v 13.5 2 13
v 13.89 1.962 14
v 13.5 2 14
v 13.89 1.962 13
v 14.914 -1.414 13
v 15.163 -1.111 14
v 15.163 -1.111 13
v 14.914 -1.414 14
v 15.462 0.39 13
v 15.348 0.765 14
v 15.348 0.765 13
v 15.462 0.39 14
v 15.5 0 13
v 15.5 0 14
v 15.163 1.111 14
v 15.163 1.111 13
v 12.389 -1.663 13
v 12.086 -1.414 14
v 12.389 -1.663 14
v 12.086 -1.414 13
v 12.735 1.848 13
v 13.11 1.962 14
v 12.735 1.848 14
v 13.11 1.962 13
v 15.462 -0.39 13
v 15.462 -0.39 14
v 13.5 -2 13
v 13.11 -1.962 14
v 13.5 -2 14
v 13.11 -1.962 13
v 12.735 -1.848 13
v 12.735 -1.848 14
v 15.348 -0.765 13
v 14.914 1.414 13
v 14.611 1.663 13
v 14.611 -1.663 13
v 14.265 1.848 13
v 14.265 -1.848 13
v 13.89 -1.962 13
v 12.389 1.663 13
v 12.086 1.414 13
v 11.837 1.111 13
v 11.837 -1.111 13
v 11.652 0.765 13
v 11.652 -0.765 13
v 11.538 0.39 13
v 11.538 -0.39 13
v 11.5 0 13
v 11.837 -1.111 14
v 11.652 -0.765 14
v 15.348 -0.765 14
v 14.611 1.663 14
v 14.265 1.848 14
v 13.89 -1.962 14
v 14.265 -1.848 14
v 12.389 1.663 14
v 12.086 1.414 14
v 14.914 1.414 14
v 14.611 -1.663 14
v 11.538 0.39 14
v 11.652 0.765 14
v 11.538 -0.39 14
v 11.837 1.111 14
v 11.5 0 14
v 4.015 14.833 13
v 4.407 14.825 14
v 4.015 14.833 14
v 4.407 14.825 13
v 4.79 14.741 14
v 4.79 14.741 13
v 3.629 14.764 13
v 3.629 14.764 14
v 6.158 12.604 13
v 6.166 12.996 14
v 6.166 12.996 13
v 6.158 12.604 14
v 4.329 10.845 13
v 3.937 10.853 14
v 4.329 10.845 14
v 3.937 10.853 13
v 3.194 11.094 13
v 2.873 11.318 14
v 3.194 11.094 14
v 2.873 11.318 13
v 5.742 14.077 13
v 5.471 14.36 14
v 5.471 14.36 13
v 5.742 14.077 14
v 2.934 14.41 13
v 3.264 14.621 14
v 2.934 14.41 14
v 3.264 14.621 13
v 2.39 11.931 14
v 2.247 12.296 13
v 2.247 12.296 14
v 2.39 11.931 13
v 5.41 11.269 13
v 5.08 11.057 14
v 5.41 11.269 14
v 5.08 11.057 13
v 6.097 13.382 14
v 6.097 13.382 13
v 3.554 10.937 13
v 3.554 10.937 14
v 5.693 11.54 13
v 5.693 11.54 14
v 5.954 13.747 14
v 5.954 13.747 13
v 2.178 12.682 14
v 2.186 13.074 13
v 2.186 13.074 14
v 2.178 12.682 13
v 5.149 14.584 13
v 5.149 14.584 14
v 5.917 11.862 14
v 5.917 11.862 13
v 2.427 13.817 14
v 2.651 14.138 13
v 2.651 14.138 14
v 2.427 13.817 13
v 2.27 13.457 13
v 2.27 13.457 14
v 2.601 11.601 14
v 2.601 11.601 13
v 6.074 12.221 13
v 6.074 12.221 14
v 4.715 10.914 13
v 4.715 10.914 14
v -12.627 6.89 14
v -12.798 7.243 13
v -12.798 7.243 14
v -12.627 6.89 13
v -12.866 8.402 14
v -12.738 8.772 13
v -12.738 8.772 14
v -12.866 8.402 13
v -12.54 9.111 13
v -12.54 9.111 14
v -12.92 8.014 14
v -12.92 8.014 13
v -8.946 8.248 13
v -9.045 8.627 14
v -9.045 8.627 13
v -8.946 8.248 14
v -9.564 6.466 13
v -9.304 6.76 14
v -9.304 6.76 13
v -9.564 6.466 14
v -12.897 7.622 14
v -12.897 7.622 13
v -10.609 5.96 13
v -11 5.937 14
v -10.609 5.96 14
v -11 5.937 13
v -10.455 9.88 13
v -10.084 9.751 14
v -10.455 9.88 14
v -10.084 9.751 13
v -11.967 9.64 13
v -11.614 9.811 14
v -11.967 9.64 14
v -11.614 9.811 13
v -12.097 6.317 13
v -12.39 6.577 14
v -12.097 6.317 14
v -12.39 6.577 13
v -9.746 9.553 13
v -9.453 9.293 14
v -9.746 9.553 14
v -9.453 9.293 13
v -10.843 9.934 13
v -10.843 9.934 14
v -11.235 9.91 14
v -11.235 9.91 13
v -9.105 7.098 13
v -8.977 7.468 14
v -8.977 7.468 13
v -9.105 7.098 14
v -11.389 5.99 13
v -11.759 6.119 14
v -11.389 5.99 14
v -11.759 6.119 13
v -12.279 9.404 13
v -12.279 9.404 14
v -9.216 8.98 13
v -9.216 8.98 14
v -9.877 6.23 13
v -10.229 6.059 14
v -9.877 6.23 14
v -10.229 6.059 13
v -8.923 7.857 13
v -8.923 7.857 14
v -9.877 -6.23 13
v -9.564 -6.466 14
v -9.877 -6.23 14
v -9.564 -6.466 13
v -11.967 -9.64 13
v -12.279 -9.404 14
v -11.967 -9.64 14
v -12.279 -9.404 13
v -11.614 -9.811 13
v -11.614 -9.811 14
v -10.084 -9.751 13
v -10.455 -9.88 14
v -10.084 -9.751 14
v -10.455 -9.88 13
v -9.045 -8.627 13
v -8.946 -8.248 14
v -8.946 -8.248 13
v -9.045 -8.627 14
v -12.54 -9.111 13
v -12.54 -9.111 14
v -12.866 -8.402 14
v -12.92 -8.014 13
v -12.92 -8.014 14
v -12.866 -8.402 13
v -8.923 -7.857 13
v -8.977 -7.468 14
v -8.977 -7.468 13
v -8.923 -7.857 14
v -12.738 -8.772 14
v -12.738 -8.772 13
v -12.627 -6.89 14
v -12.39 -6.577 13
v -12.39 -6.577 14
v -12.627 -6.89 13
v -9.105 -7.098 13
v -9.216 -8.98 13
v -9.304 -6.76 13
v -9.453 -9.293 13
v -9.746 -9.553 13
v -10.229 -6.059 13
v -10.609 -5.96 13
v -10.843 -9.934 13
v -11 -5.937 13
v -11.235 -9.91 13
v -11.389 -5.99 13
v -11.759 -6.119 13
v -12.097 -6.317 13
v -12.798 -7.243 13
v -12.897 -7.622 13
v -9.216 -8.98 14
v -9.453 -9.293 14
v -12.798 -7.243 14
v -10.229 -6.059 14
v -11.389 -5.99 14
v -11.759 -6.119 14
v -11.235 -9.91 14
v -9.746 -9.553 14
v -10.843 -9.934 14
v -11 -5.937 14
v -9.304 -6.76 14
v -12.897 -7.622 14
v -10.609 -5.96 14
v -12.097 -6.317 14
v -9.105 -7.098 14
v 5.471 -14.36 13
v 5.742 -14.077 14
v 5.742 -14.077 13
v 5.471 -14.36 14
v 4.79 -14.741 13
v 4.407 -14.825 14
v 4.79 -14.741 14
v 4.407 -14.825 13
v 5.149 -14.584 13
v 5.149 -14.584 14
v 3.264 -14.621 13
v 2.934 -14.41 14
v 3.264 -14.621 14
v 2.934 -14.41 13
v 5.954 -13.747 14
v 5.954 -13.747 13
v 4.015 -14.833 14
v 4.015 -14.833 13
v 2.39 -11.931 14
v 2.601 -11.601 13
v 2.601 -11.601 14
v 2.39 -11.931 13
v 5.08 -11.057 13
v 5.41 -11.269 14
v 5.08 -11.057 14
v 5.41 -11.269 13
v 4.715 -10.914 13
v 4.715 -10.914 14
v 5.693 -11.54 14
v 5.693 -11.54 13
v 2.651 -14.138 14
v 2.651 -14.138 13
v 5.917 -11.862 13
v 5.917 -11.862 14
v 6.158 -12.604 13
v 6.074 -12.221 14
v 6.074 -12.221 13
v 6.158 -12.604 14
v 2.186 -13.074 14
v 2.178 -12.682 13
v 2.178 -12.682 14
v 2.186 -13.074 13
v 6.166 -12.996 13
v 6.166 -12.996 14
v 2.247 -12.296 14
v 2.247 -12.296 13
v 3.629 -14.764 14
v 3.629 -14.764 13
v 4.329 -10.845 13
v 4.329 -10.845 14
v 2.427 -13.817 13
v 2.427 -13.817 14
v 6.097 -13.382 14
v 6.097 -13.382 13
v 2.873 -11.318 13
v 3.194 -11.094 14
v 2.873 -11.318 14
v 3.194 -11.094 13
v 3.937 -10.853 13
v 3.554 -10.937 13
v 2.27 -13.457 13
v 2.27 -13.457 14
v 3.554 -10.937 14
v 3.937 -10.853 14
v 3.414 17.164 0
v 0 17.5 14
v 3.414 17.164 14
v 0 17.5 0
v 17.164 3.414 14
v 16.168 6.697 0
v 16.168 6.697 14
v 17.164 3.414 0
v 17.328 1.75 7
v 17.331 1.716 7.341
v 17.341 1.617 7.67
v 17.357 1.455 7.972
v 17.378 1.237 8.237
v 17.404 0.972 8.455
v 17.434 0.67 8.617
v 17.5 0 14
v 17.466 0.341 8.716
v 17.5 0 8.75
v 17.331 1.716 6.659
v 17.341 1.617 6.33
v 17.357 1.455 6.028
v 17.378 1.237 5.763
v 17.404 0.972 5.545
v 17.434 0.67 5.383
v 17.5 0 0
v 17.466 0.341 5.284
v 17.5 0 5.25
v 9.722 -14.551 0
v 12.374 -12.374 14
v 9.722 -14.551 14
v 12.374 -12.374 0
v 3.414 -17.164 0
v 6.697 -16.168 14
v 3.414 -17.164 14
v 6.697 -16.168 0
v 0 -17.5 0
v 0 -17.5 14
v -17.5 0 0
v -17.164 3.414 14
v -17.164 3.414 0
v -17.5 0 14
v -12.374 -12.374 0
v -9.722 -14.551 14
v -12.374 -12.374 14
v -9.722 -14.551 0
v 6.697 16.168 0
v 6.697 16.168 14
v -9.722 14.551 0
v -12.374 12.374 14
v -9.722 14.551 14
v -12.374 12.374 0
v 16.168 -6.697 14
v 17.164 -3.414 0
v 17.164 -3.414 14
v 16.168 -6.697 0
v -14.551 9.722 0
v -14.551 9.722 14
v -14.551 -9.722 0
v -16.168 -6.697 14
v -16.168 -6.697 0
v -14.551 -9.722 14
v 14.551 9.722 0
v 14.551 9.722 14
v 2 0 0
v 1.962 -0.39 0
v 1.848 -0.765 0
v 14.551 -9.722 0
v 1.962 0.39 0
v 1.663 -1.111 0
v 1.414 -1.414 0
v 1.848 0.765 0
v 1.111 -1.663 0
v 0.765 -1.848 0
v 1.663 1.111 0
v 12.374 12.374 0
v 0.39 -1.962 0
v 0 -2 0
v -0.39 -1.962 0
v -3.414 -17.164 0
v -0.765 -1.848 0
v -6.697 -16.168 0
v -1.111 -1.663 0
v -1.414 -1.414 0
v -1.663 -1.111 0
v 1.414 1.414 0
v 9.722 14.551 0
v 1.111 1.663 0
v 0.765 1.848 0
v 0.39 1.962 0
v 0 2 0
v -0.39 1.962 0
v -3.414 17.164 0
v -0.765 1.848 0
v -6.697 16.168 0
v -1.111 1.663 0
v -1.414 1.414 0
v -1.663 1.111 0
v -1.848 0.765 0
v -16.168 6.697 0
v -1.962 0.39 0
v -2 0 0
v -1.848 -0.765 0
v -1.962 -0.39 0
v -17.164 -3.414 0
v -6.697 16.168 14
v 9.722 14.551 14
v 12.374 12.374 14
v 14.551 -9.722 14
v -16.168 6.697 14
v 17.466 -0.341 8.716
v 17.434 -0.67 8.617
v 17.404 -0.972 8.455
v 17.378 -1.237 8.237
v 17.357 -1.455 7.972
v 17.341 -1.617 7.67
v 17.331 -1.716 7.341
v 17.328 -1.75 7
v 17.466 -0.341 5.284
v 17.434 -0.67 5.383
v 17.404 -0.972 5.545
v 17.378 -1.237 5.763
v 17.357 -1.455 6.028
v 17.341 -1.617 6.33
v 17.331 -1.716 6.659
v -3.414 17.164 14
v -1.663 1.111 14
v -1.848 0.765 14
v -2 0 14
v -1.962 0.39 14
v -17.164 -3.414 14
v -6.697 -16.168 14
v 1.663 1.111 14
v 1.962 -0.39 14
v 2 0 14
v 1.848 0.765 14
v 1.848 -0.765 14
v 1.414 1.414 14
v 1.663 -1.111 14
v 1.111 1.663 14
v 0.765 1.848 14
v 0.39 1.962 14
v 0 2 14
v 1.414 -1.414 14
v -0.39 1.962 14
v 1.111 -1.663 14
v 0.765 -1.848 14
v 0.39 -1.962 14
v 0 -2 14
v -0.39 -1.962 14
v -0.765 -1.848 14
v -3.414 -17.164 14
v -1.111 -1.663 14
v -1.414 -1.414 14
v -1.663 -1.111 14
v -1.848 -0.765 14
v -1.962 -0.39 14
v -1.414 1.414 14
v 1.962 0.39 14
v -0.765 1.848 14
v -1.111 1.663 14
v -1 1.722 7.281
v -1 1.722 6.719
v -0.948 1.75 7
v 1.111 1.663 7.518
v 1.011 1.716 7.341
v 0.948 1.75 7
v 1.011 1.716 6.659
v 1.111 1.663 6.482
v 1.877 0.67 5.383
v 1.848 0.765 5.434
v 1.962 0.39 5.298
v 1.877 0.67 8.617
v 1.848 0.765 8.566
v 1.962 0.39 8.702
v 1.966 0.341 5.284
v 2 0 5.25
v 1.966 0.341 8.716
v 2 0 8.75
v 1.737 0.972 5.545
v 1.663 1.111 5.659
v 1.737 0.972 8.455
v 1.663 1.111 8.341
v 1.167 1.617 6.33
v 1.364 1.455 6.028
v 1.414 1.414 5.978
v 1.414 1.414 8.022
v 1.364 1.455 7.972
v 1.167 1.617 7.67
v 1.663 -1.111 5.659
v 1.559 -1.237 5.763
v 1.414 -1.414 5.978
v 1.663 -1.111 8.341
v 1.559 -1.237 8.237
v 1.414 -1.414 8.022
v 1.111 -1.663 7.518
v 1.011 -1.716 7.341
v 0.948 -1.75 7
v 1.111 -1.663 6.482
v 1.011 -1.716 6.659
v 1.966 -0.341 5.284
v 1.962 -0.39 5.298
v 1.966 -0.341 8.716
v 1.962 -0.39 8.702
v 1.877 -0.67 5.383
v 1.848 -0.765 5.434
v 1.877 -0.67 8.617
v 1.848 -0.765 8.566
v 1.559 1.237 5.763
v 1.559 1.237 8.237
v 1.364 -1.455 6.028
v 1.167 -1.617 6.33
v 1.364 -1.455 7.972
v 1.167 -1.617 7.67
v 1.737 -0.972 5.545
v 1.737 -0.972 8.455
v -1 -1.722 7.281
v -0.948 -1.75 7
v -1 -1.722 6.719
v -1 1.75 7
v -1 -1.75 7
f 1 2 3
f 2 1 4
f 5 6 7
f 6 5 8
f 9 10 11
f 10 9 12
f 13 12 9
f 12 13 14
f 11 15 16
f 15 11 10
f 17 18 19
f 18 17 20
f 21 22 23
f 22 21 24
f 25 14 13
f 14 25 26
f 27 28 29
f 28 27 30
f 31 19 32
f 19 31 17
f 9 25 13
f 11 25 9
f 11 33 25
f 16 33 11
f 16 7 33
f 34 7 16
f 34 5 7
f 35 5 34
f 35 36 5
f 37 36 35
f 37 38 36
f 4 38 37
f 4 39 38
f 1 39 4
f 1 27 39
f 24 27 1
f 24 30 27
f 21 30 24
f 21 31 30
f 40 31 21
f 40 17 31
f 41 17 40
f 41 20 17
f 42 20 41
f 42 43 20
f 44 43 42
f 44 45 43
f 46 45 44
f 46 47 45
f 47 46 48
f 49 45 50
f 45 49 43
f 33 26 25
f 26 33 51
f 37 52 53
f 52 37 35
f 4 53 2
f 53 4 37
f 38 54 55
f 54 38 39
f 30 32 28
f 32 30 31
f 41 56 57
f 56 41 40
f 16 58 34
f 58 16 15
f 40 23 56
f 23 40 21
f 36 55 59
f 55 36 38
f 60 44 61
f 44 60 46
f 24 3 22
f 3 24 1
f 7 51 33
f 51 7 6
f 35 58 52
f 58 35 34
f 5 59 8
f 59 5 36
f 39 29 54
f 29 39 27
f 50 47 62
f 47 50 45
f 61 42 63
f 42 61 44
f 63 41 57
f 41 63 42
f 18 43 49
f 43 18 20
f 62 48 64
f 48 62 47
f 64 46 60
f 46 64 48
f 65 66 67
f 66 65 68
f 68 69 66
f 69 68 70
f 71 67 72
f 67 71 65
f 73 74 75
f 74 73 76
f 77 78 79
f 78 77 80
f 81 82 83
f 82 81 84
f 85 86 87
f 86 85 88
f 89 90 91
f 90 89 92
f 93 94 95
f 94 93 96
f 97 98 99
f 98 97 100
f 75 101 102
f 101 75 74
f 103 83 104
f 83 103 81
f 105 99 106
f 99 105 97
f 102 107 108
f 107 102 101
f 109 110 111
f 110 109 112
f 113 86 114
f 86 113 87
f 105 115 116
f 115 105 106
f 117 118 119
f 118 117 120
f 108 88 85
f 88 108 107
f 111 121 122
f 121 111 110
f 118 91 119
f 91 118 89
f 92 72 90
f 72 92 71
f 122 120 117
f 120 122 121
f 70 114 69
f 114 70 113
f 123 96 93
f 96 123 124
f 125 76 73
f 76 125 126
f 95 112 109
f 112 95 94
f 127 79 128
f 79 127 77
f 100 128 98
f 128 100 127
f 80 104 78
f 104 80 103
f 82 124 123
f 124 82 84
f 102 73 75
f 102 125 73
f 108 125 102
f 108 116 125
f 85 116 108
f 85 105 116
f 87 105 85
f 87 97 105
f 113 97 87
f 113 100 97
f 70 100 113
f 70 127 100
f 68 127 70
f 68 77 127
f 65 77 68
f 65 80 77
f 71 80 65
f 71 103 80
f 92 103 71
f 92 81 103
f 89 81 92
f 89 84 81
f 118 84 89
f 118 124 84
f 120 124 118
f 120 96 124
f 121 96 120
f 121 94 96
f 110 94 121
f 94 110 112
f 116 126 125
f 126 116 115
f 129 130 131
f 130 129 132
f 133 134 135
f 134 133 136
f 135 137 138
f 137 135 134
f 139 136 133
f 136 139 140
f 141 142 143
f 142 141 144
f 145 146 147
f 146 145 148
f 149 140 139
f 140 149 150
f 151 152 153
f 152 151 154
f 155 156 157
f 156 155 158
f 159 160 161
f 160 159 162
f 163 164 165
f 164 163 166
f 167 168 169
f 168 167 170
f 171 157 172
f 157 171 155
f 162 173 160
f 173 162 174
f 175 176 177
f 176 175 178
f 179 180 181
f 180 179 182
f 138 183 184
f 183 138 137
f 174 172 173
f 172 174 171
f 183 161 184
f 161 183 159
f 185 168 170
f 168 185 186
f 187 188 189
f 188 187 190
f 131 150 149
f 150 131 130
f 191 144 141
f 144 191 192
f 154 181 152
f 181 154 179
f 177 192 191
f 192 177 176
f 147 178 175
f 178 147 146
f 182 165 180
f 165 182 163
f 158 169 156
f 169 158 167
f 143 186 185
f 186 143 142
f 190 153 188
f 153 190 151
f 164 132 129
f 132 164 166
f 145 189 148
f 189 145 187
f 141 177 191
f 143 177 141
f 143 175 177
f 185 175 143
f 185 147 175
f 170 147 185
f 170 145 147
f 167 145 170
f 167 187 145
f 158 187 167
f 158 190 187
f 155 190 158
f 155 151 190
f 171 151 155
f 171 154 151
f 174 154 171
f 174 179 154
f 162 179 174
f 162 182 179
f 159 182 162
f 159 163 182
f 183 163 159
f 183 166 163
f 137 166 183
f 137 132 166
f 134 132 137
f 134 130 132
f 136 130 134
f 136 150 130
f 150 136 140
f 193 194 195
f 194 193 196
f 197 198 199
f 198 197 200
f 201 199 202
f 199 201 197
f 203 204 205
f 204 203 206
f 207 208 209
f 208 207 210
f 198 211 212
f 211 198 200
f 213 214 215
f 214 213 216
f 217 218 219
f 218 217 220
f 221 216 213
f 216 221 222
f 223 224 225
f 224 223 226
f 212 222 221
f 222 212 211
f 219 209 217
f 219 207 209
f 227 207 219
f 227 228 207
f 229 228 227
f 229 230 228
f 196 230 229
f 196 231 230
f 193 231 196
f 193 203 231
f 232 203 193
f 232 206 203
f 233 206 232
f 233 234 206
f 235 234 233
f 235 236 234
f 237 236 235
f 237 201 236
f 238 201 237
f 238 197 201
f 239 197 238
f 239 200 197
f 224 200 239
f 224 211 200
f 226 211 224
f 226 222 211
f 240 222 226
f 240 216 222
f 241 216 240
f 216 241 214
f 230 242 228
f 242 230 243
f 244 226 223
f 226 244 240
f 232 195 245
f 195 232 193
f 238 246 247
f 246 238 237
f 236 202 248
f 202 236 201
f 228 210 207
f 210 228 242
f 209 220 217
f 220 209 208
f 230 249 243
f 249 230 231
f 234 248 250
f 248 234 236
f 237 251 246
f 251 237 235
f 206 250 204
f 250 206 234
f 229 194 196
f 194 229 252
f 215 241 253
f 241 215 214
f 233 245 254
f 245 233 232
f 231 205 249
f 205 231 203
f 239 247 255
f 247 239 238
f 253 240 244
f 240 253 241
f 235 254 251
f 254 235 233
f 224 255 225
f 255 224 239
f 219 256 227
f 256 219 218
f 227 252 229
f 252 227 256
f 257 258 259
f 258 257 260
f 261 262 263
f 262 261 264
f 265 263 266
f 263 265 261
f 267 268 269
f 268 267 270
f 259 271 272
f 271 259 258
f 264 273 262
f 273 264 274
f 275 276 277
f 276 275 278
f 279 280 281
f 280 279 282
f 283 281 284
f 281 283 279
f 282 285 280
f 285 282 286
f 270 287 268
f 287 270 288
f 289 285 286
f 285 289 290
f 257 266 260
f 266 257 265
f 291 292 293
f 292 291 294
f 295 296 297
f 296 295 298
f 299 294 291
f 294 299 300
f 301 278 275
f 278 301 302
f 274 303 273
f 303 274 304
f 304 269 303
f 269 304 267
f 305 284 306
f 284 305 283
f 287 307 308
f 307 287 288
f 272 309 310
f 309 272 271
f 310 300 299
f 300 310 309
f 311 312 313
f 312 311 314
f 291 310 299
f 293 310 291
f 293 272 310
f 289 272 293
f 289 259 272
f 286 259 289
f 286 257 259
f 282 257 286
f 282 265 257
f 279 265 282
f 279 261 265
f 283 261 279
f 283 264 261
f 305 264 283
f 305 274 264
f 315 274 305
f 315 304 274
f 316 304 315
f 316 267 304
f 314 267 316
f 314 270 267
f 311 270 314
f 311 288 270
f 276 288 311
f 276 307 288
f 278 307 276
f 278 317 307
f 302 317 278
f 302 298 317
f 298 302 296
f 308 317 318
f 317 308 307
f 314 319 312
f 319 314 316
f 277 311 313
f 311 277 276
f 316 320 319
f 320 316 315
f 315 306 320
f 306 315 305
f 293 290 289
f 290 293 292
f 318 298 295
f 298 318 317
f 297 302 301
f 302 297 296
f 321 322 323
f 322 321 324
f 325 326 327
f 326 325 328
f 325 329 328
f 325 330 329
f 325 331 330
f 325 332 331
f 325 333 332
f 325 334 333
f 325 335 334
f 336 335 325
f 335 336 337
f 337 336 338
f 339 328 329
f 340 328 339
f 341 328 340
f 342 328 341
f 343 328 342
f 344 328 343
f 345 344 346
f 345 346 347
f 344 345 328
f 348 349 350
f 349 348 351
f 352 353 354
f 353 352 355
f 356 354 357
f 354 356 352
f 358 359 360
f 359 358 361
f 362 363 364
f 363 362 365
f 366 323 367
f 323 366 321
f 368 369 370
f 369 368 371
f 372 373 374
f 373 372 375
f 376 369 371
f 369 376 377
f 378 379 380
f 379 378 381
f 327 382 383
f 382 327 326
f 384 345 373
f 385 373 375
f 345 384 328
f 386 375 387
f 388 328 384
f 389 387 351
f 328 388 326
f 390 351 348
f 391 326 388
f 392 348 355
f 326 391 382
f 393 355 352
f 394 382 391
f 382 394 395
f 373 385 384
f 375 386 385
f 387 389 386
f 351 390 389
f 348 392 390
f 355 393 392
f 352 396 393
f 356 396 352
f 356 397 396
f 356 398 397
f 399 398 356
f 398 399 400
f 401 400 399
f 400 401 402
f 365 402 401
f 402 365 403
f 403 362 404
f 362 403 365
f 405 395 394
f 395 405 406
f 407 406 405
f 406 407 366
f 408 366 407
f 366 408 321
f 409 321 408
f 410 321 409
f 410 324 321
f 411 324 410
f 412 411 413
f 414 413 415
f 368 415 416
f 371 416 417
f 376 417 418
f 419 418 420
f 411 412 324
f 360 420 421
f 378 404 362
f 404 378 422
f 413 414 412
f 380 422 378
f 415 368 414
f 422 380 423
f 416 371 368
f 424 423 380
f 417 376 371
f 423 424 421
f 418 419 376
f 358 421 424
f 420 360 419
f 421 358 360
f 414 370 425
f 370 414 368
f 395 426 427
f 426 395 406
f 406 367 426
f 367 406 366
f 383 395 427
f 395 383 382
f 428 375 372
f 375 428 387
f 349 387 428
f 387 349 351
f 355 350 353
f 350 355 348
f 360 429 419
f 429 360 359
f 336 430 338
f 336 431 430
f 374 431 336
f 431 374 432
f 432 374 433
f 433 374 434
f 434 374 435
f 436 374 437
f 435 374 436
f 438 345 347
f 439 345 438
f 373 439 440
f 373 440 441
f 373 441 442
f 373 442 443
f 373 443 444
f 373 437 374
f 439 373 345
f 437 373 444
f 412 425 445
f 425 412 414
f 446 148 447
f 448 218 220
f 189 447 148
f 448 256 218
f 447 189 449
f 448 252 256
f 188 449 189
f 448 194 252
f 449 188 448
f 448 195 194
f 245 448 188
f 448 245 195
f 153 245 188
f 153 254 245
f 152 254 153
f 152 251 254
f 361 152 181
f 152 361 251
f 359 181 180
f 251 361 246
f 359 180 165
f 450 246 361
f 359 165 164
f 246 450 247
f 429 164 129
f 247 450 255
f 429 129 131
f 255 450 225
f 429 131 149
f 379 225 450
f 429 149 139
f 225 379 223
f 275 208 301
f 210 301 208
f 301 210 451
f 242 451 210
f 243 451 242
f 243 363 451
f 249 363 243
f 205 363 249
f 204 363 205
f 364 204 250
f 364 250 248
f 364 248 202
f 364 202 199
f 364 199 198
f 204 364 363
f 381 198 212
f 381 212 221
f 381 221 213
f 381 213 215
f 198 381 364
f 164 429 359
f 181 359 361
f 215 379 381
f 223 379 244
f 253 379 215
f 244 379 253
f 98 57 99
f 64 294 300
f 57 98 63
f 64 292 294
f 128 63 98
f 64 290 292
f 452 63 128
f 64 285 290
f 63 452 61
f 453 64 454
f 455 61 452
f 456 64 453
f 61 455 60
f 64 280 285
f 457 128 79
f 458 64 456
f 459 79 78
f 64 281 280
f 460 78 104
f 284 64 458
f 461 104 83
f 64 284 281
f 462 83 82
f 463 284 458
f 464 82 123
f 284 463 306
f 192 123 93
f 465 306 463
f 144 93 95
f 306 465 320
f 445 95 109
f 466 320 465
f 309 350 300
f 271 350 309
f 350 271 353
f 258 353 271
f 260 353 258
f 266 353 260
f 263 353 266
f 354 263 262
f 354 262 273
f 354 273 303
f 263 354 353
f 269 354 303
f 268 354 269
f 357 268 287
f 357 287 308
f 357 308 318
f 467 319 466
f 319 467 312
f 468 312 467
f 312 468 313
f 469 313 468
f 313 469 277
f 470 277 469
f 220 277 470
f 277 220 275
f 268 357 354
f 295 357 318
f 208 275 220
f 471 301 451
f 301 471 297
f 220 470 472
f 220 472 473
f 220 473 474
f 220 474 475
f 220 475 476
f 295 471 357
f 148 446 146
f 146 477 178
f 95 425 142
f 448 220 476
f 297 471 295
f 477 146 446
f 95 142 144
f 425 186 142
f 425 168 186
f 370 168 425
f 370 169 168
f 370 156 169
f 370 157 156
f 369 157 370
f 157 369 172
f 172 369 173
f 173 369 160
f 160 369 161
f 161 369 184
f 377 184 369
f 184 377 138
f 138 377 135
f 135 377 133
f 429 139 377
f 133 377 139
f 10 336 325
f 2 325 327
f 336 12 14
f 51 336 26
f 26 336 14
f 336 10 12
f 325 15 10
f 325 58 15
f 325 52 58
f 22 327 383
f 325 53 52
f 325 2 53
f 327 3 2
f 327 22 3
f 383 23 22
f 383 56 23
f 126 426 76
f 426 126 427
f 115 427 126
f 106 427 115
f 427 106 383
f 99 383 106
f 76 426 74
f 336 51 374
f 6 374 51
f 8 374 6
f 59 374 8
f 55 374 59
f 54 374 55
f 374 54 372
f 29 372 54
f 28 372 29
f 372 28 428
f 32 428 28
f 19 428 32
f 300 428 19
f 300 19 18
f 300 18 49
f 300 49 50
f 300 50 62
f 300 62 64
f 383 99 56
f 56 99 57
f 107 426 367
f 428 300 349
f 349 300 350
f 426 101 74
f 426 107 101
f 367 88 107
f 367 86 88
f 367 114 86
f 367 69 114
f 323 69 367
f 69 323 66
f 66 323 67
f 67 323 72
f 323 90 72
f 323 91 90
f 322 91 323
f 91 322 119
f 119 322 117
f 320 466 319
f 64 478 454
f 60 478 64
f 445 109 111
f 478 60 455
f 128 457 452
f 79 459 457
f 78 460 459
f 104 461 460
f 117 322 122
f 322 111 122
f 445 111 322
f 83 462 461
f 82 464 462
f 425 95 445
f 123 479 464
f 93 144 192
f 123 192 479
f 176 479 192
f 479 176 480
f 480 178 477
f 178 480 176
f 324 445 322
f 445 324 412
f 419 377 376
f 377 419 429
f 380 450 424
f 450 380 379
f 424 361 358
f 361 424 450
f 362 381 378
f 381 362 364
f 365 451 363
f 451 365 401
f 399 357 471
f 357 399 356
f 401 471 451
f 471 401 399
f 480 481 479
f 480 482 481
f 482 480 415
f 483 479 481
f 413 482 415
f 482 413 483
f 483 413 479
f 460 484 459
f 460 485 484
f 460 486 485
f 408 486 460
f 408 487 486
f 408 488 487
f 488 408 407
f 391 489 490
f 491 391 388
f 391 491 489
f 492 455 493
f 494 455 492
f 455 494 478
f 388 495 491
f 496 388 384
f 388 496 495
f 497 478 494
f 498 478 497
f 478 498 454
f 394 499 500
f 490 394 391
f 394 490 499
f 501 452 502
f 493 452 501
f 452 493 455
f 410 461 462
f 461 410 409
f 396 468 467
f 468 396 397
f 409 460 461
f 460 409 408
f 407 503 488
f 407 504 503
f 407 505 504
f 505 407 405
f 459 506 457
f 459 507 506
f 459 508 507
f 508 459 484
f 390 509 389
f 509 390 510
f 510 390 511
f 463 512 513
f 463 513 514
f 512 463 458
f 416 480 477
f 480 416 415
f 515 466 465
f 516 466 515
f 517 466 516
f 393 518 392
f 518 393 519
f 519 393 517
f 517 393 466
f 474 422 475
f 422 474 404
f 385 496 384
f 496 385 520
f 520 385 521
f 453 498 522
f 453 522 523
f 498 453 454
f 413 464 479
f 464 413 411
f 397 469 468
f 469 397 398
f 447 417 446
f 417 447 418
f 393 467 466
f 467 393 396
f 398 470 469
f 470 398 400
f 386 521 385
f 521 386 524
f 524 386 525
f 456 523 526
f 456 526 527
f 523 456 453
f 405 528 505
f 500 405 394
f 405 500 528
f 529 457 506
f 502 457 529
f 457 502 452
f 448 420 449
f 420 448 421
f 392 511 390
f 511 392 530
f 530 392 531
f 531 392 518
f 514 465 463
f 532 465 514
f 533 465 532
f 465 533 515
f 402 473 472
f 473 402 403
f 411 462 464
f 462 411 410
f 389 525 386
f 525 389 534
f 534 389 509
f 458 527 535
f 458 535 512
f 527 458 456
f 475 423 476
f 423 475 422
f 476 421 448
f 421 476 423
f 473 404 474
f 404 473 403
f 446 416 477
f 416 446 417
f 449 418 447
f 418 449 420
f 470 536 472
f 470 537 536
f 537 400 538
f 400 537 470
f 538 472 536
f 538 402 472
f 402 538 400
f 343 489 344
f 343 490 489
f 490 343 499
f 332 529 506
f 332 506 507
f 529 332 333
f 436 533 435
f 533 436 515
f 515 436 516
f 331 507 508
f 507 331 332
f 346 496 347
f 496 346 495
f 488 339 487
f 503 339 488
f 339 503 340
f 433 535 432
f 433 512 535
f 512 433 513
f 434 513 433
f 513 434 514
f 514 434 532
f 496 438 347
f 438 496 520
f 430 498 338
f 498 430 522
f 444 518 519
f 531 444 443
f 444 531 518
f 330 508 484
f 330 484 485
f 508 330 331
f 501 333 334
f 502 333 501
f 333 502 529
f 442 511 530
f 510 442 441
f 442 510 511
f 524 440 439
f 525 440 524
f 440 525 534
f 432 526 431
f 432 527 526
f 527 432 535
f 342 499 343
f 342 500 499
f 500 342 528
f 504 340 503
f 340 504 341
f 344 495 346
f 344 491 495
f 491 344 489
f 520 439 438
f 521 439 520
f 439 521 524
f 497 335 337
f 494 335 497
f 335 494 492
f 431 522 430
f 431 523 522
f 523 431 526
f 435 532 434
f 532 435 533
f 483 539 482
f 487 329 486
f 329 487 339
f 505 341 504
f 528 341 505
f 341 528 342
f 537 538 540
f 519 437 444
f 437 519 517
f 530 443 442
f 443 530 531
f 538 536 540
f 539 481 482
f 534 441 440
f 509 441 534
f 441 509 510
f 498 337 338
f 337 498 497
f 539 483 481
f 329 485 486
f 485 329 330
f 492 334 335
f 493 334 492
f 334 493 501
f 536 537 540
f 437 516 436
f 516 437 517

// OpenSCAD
$fn = 32;

// ----------------------------------------------------------------------
// Control knob: dimpled knob
// ----------------------------------------------------------------------

// --- parameters (mm) ---
dimp_d = 4;               // finger dimple diameter
n_dimp = 5;               // number of dimples
dimp_r = 13.5;            // dimple ring radius
knob_d = 35;              // knob body diameter
knob_h = 14;              // knob body height
bore_d = 4;               // shaft bore diameter
set_d = 3.5;              // set screw bore diameter

dimp_step = 360 / n_dimp;  // dimple angular step

difference() {
  cylinder(h = knob_h, d = knob_d);
  translate([0, 0, -1]) cylinder(h = knob_h + 2, d = bore_d);
  translate([-1, 0, knob_h / 2]) rotate([0, 90, 0])
    cylinder(h = knob_d / 2 + bore_d / 2 + 2, d = set_d);  for (i = [0 : n_dimp - 1])
    rotate([0, 0, i * dimp_step])
      translate([dimp_r, 0, knob_h - 1])
        cylinder(h = 2, d = dimp_d);
}
